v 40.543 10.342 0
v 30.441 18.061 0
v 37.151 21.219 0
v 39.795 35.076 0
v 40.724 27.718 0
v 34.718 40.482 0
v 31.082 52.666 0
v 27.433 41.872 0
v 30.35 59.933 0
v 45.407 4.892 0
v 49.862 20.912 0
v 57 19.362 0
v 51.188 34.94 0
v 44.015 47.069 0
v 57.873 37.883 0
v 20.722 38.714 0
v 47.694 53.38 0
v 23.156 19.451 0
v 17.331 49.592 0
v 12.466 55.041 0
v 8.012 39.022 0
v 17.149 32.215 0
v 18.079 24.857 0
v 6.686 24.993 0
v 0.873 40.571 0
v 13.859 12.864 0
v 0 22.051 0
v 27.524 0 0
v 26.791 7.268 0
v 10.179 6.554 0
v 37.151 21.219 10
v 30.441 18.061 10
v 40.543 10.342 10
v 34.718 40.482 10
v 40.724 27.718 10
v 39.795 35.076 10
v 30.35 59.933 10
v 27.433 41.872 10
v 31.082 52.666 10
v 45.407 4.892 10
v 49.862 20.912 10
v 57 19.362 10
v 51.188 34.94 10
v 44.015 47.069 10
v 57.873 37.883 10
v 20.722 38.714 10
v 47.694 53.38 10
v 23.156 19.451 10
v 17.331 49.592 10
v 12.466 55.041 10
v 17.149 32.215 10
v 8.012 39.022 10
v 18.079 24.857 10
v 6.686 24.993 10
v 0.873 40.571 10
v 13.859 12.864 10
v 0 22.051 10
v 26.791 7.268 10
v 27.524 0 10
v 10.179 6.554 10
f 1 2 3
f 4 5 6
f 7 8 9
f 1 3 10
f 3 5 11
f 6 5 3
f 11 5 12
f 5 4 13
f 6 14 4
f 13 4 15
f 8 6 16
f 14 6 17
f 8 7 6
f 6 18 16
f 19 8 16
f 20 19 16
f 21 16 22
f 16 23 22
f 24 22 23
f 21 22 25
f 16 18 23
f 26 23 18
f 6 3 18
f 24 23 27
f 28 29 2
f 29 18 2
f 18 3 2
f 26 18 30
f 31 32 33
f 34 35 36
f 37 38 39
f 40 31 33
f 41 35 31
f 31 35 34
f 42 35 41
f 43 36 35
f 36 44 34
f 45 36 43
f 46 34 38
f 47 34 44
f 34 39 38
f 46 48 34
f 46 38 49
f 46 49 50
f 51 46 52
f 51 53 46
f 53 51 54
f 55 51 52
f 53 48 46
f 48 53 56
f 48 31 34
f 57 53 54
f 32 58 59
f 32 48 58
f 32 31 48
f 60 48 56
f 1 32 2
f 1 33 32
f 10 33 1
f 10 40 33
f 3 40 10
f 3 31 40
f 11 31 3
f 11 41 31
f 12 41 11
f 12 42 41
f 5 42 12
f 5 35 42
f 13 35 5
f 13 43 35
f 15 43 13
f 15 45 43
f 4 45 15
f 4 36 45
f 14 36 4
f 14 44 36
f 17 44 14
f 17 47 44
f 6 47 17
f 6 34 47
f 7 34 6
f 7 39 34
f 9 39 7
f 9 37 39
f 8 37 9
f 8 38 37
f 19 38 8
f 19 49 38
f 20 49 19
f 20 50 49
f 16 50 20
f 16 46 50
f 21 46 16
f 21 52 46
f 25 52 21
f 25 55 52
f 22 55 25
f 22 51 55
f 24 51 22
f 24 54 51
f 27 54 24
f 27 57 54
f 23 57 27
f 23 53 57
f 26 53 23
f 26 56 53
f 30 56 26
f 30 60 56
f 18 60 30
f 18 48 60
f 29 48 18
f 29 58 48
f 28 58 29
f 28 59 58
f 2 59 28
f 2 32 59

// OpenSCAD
$fn = 32;

// ----------------------------------------------------------------------
// Fan rotor section: 10 blades, 12 mm hub radius, 18 mm blades
// ----------------------------------------------------------------------

// --- parameters (mm) ---
profile_height = 10;      // extrusion height
profile_points = 30;      // points of the closed outline

profile = [[40.724, 27.718], [51.188, 34.94], [57.873, 37.883], [39.795, 35.076], [44.015, 47.069], [47.694, 53.38], [34.718, 40.482], [31.082, 52.666], [30.35, 59.933], [27.433, 41.872], [17.331, 49.592], [12.466, 55.041], [20.722, 38.714], [8.012, 39.022], [0.873, 40.571], [17.149, 32.215], [6.686, 24.993], [0, 22.051], [18.079, 24.857], [13.859, 12.864], [10.179, 6.554], [23.156, 19.451], [26.791, 7.268], [27.524, 0], [30.441, 18.061], [40.543, 10.342], [45.407, 4.892], [37.151, 21.219], [49.862, 20.912], [57, 19.362]];  // single closed polygon, 30 points, counter clockwise

// --- the one profile operation ---
linear_extrude(height = profile_height) polygon(points = profile);
